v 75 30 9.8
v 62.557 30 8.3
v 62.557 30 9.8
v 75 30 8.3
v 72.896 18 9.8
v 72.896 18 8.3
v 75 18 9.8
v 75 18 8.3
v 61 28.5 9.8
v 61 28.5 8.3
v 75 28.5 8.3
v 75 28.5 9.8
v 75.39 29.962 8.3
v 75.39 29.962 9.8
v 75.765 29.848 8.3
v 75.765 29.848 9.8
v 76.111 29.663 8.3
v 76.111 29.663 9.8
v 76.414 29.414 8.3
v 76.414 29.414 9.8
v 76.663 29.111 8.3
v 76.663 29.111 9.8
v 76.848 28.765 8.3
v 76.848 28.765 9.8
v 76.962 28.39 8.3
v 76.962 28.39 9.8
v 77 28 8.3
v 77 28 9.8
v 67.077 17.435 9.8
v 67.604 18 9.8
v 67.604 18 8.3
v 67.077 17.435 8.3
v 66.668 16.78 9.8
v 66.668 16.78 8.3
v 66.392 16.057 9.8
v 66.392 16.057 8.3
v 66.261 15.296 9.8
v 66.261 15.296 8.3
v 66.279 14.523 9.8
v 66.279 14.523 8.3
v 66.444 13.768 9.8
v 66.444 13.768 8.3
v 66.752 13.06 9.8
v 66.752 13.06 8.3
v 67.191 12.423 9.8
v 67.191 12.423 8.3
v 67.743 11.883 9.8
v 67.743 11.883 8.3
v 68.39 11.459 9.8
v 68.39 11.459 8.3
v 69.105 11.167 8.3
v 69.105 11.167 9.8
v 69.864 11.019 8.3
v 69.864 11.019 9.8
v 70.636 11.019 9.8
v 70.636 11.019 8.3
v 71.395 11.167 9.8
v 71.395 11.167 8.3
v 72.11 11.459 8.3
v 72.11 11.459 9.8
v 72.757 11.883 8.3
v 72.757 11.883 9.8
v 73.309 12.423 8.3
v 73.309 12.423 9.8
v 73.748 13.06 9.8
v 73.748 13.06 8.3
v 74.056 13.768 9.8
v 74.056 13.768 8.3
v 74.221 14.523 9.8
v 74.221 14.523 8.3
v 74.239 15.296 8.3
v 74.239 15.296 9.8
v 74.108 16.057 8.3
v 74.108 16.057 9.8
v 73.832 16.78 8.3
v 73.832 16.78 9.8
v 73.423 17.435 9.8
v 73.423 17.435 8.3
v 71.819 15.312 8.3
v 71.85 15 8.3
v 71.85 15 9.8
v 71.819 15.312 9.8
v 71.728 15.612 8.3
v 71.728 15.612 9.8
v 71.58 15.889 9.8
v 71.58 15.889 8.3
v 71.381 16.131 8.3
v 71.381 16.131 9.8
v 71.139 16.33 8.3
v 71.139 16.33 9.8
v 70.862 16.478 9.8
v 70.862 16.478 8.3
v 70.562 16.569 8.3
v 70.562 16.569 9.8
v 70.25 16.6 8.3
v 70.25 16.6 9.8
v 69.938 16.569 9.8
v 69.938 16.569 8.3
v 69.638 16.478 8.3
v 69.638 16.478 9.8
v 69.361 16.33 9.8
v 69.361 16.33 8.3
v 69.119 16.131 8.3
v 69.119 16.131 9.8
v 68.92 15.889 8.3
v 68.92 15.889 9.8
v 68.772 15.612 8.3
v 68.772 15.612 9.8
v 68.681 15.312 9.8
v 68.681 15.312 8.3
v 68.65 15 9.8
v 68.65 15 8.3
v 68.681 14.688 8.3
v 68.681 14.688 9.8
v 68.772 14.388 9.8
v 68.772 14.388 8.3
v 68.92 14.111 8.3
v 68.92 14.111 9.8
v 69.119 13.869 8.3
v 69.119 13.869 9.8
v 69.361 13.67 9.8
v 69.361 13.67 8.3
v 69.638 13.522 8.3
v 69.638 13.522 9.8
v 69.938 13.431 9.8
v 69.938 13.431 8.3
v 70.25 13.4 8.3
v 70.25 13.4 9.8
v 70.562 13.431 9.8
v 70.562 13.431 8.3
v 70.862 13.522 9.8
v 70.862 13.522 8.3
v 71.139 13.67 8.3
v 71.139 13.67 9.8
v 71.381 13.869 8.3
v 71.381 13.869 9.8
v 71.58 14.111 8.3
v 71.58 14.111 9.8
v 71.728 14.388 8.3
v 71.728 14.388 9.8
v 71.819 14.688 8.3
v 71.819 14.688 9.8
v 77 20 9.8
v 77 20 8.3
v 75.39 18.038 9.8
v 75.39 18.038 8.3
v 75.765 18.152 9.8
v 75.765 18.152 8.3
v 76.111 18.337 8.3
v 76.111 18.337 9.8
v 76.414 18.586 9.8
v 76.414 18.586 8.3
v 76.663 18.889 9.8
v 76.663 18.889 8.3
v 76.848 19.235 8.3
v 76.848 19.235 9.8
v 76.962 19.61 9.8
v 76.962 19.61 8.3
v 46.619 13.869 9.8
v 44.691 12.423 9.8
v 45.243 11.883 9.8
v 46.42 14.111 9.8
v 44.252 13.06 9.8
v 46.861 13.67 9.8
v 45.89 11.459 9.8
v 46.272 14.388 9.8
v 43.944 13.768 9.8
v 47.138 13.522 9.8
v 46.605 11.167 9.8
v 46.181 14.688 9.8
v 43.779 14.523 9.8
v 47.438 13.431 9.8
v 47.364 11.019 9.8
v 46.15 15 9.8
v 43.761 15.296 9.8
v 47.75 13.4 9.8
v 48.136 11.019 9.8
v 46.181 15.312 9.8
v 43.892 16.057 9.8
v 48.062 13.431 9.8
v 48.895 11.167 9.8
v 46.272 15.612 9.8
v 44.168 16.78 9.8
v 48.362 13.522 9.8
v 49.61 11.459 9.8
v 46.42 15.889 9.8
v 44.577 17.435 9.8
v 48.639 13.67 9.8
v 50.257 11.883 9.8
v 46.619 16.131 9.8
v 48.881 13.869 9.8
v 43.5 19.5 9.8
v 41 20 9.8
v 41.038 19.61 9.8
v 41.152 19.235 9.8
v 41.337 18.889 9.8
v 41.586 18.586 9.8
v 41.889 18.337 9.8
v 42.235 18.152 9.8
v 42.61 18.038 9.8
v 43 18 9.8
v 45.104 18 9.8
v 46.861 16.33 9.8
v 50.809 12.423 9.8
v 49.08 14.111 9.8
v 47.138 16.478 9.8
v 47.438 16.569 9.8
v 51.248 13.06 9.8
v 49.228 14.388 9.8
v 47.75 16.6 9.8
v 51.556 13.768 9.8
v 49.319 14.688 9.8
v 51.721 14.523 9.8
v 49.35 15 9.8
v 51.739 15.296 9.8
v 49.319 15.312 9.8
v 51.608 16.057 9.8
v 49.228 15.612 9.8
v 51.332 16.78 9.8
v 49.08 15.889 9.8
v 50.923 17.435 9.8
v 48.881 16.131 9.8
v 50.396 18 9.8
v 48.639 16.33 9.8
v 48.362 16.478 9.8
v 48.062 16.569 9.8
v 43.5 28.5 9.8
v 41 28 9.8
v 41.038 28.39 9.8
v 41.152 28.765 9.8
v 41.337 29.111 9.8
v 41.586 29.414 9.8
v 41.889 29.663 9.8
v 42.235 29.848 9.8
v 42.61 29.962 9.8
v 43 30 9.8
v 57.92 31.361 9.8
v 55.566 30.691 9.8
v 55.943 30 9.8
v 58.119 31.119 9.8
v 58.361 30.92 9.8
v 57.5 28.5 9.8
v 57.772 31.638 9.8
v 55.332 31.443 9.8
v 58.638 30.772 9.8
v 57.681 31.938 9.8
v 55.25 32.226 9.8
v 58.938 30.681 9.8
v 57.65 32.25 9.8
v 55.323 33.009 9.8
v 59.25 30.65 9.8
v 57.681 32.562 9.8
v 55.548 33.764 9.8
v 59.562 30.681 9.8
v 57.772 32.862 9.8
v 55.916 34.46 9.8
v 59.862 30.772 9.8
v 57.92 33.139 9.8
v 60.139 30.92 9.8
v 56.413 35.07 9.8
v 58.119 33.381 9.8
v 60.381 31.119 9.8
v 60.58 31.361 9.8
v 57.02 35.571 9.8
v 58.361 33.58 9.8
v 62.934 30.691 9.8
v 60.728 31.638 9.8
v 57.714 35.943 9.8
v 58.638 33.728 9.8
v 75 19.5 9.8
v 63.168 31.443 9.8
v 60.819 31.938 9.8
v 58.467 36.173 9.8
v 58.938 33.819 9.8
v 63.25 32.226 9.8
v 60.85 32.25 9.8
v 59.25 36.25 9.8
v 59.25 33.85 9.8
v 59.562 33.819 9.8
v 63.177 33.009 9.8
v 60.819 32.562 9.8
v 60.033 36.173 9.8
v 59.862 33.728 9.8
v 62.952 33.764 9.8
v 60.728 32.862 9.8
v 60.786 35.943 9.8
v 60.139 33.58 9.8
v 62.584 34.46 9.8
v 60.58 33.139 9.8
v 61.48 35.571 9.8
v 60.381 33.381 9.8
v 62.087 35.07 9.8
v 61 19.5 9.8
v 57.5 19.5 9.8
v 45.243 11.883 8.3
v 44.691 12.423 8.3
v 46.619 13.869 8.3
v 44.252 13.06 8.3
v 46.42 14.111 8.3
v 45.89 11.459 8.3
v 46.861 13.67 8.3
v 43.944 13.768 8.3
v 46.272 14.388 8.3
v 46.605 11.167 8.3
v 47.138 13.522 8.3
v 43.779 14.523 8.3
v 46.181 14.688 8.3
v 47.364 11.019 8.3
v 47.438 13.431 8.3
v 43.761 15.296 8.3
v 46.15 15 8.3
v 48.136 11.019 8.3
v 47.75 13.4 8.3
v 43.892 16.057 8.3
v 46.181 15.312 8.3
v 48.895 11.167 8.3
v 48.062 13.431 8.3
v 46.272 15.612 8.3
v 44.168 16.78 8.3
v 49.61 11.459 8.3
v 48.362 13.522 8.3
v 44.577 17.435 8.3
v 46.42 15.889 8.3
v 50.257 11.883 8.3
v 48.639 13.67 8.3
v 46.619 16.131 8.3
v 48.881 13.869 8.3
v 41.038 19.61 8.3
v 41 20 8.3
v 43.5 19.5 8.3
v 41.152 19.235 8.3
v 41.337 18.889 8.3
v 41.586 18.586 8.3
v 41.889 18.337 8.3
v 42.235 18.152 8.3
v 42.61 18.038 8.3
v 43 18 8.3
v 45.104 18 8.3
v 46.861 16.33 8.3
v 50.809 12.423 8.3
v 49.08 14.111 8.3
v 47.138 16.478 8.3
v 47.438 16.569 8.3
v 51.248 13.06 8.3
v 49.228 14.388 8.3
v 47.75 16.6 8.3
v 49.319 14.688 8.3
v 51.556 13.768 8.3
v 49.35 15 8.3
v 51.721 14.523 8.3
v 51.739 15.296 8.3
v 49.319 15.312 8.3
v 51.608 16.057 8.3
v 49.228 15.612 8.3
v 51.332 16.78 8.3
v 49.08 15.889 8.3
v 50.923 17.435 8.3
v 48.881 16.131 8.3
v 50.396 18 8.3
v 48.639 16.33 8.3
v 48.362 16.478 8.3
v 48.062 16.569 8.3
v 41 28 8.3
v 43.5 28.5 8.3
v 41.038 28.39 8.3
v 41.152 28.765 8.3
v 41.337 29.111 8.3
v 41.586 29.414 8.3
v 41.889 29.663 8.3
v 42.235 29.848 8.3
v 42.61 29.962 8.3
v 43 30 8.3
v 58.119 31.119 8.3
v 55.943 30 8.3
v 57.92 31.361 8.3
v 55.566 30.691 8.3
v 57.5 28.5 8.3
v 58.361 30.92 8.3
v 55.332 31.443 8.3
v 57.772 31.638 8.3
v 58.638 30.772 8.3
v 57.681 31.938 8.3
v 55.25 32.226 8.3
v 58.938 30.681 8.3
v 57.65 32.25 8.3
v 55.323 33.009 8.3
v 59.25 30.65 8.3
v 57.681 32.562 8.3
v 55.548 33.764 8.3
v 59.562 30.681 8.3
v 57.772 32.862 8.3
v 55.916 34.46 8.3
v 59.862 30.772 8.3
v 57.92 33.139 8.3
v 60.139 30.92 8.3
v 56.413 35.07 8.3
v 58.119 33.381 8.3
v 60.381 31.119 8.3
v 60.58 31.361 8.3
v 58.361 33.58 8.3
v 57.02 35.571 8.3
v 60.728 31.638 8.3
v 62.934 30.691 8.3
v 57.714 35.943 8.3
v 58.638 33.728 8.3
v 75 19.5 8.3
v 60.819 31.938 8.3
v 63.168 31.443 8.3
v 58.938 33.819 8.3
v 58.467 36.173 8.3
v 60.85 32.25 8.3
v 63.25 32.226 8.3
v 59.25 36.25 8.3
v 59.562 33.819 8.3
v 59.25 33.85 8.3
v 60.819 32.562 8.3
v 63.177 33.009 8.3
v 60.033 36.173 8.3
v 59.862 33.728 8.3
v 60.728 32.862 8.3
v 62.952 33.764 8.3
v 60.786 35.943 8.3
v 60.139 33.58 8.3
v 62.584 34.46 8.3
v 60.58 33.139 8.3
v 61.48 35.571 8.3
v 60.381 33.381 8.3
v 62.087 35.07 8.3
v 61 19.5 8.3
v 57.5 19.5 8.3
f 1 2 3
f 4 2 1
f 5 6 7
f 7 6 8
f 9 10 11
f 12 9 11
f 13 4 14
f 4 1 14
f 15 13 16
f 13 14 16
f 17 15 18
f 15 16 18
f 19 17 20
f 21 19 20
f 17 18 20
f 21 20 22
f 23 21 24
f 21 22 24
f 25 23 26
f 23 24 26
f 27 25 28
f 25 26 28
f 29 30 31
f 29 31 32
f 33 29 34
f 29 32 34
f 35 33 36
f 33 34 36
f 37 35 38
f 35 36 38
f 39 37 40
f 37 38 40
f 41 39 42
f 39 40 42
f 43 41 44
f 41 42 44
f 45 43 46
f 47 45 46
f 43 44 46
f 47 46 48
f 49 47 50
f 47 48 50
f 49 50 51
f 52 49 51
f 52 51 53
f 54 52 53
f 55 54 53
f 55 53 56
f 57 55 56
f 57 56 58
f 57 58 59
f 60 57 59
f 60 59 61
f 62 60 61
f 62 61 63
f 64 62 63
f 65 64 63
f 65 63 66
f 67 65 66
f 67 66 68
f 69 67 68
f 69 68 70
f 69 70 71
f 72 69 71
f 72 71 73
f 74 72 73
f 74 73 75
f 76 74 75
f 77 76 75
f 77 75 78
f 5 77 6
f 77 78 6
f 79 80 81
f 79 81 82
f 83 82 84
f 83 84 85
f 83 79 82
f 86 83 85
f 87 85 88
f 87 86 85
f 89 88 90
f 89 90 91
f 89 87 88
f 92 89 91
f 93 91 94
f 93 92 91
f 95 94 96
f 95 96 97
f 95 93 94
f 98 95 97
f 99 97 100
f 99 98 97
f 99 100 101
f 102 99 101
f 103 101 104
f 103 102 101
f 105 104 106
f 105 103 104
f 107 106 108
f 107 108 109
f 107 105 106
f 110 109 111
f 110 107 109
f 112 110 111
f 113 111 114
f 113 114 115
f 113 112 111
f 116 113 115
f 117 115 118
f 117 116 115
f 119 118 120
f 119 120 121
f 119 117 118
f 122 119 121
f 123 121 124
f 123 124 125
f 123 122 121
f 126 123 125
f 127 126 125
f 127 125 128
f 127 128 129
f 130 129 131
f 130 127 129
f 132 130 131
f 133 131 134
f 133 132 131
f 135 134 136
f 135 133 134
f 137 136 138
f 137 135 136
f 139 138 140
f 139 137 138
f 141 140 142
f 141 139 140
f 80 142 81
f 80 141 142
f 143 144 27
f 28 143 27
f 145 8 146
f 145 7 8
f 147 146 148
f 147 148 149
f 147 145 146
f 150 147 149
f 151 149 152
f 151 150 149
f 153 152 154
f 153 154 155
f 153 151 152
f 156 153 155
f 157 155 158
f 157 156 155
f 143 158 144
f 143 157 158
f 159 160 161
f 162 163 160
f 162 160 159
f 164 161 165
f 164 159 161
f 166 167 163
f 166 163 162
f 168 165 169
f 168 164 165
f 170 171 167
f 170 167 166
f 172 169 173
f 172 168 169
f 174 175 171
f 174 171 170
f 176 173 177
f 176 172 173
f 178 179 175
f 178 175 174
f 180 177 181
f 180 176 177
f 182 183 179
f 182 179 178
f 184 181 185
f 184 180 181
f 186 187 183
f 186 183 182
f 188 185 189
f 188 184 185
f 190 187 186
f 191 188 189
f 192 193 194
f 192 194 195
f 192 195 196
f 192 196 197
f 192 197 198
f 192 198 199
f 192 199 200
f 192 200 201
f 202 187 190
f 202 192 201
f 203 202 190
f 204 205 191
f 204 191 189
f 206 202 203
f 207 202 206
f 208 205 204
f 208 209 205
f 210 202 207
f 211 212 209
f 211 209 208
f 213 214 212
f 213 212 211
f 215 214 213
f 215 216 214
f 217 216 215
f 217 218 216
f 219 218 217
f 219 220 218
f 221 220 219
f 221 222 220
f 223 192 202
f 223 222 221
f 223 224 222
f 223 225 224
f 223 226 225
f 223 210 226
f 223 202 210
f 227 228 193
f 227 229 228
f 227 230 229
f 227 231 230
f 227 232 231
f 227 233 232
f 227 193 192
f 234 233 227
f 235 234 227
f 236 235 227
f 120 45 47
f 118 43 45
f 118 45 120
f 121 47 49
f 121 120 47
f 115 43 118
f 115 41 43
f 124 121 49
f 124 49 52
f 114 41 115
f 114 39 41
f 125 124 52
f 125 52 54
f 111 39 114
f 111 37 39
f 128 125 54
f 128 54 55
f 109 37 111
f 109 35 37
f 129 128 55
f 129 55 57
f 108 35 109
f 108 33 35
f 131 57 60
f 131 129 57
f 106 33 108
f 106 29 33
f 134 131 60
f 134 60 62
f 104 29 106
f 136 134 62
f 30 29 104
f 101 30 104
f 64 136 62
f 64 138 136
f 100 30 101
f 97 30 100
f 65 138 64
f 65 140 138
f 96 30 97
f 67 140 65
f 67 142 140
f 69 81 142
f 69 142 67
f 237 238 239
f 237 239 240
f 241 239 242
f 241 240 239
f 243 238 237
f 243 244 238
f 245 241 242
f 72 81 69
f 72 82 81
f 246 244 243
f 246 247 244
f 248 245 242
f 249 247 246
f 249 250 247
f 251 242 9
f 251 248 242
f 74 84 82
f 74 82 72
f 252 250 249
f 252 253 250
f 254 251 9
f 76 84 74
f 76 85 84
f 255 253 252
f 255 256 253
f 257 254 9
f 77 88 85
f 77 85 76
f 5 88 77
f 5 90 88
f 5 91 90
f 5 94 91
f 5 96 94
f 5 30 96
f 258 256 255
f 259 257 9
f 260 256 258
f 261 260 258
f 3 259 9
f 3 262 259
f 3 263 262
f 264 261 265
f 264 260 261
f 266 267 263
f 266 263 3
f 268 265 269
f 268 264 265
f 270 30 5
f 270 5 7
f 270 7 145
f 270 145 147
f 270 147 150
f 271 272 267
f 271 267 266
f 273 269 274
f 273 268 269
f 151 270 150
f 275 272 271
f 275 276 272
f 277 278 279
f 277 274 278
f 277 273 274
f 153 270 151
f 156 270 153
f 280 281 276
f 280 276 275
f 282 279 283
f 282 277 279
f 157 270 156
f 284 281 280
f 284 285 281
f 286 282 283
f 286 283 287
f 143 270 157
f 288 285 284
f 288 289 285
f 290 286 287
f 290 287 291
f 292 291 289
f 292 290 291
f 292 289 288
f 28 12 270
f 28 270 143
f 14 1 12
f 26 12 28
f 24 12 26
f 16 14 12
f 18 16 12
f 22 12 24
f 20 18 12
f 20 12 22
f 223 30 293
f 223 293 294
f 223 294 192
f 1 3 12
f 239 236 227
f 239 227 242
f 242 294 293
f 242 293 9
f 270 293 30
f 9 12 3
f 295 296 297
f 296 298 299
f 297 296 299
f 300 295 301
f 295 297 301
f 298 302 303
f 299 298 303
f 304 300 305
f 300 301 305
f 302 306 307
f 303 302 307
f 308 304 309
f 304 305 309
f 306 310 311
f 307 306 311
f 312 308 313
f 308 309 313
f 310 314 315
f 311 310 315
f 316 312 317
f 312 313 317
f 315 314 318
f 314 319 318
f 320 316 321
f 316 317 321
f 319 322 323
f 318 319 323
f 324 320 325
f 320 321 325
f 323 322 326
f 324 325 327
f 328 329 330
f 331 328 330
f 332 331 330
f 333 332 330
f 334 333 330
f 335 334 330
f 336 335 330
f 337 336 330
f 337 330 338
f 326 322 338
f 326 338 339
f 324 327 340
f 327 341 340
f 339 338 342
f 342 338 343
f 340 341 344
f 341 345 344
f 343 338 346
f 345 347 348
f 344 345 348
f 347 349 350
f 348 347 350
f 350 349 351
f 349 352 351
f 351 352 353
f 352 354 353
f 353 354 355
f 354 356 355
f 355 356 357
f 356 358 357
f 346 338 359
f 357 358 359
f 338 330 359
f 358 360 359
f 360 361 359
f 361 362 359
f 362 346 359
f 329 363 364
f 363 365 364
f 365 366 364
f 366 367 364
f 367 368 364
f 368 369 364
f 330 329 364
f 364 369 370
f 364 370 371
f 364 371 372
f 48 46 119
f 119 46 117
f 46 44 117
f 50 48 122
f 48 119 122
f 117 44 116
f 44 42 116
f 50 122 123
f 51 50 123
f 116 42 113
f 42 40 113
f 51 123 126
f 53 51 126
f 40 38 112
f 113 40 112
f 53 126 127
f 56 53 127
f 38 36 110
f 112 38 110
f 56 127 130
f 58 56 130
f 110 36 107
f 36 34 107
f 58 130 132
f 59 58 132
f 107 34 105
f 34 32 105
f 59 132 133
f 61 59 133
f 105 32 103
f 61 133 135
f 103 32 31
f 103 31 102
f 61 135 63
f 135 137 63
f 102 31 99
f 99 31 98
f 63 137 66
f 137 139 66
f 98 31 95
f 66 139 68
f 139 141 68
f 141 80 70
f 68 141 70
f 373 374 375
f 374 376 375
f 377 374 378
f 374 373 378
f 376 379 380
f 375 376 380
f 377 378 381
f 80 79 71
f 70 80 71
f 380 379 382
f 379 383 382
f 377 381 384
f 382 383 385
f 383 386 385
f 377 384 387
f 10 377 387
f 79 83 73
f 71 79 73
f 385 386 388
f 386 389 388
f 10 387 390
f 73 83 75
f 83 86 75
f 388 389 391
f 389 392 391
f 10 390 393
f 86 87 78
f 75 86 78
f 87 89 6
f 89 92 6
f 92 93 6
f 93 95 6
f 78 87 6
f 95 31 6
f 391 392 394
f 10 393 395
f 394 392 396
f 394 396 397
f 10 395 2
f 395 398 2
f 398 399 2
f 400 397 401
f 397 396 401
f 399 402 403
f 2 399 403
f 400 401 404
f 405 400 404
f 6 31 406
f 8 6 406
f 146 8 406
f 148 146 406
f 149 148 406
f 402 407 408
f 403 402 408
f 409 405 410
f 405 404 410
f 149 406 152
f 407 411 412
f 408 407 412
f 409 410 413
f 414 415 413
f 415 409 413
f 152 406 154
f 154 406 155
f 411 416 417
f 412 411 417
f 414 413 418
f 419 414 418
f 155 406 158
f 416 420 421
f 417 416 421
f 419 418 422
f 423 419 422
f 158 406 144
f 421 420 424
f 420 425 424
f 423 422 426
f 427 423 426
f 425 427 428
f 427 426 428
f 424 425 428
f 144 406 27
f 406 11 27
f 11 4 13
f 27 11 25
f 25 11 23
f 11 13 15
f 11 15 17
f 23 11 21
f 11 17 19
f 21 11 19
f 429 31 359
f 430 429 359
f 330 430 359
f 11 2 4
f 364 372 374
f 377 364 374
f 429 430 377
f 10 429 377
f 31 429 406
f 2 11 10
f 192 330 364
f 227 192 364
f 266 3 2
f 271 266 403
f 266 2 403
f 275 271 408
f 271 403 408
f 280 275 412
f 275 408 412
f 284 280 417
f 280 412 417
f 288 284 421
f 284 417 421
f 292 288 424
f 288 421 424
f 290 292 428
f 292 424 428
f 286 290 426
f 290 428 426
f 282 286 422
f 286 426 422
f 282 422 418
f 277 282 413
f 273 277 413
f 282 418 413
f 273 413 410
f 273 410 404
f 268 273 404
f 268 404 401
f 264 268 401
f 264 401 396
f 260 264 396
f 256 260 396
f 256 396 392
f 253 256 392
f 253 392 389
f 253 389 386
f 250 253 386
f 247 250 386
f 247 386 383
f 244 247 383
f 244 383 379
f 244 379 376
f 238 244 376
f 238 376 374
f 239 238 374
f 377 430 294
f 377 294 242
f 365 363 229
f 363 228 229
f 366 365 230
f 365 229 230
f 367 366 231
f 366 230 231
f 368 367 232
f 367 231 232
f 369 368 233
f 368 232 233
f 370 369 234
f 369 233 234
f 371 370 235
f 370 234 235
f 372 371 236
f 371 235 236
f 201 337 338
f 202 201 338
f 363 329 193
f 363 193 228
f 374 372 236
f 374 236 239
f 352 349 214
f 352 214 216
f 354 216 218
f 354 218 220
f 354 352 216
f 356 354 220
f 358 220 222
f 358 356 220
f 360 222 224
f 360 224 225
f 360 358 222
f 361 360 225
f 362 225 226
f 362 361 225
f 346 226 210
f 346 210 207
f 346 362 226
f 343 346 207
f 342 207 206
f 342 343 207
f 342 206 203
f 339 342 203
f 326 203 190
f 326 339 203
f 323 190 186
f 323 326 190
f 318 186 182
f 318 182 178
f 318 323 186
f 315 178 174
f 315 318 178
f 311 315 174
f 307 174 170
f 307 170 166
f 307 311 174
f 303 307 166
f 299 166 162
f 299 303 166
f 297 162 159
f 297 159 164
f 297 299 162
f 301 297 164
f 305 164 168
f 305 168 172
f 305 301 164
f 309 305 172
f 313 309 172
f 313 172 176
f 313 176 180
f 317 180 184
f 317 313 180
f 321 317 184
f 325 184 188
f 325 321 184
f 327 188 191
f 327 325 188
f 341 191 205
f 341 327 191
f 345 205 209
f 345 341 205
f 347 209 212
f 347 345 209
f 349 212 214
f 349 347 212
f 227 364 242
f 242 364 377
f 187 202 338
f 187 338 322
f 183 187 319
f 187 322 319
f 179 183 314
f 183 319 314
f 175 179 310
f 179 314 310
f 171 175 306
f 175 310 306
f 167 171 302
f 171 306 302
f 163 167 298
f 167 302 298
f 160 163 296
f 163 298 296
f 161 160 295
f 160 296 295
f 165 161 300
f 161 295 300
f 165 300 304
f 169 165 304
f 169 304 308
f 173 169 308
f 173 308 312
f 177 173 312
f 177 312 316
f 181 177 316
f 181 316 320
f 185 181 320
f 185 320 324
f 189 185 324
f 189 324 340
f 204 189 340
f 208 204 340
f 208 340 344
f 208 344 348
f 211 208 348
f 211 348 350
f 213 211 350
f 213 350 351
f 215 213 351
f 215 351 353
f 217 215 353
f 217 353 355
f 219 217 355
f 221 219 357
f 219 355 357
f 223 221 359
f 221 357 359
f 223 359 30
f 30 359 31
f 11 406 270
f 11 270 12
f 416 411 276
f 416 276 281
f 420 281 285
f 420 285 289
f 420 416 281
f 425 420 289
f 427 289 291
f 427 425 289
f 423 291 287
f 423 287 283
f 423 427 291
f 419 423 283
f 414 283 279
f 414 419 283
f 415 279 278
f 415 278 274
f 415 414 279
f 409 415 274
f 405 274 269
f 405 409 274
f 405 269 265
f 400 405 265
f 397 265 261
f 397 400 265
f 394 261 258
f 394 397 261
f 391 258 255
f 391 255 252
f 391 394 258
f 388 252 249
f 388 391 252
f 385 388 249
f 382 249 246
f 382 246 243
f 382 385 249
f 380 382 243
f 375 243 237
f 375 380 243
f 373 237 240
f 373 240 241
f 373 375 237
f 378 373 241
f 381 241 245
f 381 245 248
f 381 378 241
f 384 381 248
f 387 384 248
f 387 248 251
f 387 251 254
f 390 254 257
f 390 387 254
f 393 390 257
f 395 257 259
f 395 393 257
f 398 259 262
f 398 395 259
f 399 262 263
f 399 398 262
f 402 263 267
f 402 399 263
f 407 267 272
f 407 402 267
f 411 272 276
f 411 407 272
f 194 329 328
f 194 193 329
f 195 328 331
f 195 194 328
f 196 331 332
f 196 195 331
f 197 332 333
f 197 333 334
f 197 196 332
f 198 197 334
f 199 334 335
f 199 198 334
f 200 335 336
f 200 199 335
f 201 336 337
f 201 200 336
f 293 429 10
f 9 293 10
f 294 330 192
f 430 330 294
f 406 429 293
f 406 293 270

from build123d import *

# Parameters (mm, degrees)
CYLINDER081_R     = 1.6
CYLINDER081_DEPTH = 1.5
CYLINDER082_R     = 4
CYLINDER082_DEPTH = 1.5
CYLINDER083_R     = 1.6
CYLINDER083_DEPTH = 1.5
CYLINDER084_R     = 4
CYLINDER084_DEPTH = 1.5
BOX207_W          = 14
BOX207_H          = 9
BOX207_DEPTH      = 1.5
BOX206_W          = 14
BOX206_H          = 9
BOX206_DEPTH      = 1.5
BOX205_W          = 36
BOX205_H          = 12
BOX205_DEPTH      = 1.5
FILLET050_R       = 2
CYLINDER080_R     = 1.6
CYLINDER080_DEPTH = 1.5
CYLINDER079_R     = 4
CYLINDER079_DEPTH = 1.5


with BuildPart() as cylinder162:
    # Cylinder081 → Cylinder081 (new body)
    with BuildSketch(Plane(origin=(70.25, 15, 8.3), x_dir=(1, 0, 0), z_dir=(0, 0, 1))):
        Circle(CYLINDER081_R)
    extrude(amount=CYLINDER081_DEPTH)


with BuildPart() as cut104:
    # Cylinder082 → Cylinder082 (new body)
    with BuildSketch(Plane(origin=(70.25, 15, 8.3), x_dir=(1, 0, 0), z_dir=(0, 0, 1))):
        Circle(CYLINDER082_R)
    extrude(amount=CYLINDER082_DEPTH)

    # Cut104: cut Cylinder162
    add(cylinder162.part, mode=Mode.SUBTRACT)


with BuildPart() as cylinder164:
    # Cylinder083 → Cylinder083 (new body)
    with BuildSketch(Plane(origin=(59.25, 32.25, 8.3), x_dir=(1, 0, 0), z_dir=(0, 0, 1))):
        Circle(CYLINDER083_R)
    extrude(amount=CYLINDER083_DEPTH)


with BuildPart() as cut105:
    # Cylinder084 → Cylinder084 (new body)
    with BuildSketch(Plane(origin=(59.25, 32.25, 8.3), x_dir=(1, 0, 0), z_dir=(0, 0, 1))):
        Circle(CYLINDER084_R)
    extrude(amount=CYLINDER084_DEPTH)

    # Cut105: cut Cylinder164
    add(cylinder164.part, mode=Mode.SUBTRACT)


with BuildPart() as cube196:
    # Box207 → Box207 (new body)
    with BuildSketch(Plane(origin=(61, 19.5, 8.3), x_dir=(1, 0, 0), z_dir=(0, 0, 1))):
        with Locations((7, 4.5)):
            Rectangle(BOX207_W, BOX207_H)
    extrude(amount=BOX207_DEPTH)


with BuildPart() as cube195:
    # Box206 → Box206 (new body)
    with BuildSketch(Plane(origin=(43.5, 19.5, 8.3), x_dir=(1, 0, 0), z_dir=(0, 0, 1))):
        with Locations((7, 4.5)):
            Rectangle(BOX206_W, BOX206_H)
    extrude(amount=BOX206_DEPTH)


with BuildPart() as fillet050:
    # Box205 → Box205 (new body)
    with BuildSketch(Plane(origin=(41, 18, 8.3), x_dir=(1, 0, 0), z_dir=(0, 0, 1))):
        with Locations((18, 6)):
            Rectangle(BOX205_W, BOX205_H)
    extrude(amount=BOX205_DEPTH)

    # Cut106: cut Cube195
    add(cube195.part, mode=Mode.SUBTRACT)

    # Cut107: cut Cube196
    add(cube196.part, mode=Mode.SUBTRACT)

    # Fillet050
    fillet050_edges = [fillet050.edges().sort_by_distance(p)[0] for p in [
        (41, 18, 9.05),
        (41, 30, 9.05),
        (77, 18, 9.05),
        (77, 30, 9.05),
    ]]
    fillet(fillet050_edges, radius=FILLET050_R)


with BuildPart() as cylinder161:
    # Cylinder080 → Cylinder080 (new body)
    with BuildSketch(Plane(origin=(47.75, 15, 8.3), x_dir=(1, 0, 0), z_dir=(0, 0, 1))):
        Circle(CYLINDER080_R)
    extrude(amount=CYLINDER080_DEPTH)


with BuildPart() as fusion064:
    # Cylinder079 → Cylinder079 (new body)
    with BuildSketch(Plane(origin=(47.75, 15, 8.3), x_dir=(1, 0, 0), z_dir=(0, 0, 1))):
        Circle(CYLINDER079_R)
    extrude(amount=CYLINDER079_DEPTH)

    # Cut103: cut Cylinder161
    add(cylinder161.part, mode=Mode.SUBTRACT)

    # Fusion064: union Cut104, Cut105, Fillet050
    add(cut104.part)
    add(cut105.part)
    add(fillet050.part)


solid = fusion064.part
